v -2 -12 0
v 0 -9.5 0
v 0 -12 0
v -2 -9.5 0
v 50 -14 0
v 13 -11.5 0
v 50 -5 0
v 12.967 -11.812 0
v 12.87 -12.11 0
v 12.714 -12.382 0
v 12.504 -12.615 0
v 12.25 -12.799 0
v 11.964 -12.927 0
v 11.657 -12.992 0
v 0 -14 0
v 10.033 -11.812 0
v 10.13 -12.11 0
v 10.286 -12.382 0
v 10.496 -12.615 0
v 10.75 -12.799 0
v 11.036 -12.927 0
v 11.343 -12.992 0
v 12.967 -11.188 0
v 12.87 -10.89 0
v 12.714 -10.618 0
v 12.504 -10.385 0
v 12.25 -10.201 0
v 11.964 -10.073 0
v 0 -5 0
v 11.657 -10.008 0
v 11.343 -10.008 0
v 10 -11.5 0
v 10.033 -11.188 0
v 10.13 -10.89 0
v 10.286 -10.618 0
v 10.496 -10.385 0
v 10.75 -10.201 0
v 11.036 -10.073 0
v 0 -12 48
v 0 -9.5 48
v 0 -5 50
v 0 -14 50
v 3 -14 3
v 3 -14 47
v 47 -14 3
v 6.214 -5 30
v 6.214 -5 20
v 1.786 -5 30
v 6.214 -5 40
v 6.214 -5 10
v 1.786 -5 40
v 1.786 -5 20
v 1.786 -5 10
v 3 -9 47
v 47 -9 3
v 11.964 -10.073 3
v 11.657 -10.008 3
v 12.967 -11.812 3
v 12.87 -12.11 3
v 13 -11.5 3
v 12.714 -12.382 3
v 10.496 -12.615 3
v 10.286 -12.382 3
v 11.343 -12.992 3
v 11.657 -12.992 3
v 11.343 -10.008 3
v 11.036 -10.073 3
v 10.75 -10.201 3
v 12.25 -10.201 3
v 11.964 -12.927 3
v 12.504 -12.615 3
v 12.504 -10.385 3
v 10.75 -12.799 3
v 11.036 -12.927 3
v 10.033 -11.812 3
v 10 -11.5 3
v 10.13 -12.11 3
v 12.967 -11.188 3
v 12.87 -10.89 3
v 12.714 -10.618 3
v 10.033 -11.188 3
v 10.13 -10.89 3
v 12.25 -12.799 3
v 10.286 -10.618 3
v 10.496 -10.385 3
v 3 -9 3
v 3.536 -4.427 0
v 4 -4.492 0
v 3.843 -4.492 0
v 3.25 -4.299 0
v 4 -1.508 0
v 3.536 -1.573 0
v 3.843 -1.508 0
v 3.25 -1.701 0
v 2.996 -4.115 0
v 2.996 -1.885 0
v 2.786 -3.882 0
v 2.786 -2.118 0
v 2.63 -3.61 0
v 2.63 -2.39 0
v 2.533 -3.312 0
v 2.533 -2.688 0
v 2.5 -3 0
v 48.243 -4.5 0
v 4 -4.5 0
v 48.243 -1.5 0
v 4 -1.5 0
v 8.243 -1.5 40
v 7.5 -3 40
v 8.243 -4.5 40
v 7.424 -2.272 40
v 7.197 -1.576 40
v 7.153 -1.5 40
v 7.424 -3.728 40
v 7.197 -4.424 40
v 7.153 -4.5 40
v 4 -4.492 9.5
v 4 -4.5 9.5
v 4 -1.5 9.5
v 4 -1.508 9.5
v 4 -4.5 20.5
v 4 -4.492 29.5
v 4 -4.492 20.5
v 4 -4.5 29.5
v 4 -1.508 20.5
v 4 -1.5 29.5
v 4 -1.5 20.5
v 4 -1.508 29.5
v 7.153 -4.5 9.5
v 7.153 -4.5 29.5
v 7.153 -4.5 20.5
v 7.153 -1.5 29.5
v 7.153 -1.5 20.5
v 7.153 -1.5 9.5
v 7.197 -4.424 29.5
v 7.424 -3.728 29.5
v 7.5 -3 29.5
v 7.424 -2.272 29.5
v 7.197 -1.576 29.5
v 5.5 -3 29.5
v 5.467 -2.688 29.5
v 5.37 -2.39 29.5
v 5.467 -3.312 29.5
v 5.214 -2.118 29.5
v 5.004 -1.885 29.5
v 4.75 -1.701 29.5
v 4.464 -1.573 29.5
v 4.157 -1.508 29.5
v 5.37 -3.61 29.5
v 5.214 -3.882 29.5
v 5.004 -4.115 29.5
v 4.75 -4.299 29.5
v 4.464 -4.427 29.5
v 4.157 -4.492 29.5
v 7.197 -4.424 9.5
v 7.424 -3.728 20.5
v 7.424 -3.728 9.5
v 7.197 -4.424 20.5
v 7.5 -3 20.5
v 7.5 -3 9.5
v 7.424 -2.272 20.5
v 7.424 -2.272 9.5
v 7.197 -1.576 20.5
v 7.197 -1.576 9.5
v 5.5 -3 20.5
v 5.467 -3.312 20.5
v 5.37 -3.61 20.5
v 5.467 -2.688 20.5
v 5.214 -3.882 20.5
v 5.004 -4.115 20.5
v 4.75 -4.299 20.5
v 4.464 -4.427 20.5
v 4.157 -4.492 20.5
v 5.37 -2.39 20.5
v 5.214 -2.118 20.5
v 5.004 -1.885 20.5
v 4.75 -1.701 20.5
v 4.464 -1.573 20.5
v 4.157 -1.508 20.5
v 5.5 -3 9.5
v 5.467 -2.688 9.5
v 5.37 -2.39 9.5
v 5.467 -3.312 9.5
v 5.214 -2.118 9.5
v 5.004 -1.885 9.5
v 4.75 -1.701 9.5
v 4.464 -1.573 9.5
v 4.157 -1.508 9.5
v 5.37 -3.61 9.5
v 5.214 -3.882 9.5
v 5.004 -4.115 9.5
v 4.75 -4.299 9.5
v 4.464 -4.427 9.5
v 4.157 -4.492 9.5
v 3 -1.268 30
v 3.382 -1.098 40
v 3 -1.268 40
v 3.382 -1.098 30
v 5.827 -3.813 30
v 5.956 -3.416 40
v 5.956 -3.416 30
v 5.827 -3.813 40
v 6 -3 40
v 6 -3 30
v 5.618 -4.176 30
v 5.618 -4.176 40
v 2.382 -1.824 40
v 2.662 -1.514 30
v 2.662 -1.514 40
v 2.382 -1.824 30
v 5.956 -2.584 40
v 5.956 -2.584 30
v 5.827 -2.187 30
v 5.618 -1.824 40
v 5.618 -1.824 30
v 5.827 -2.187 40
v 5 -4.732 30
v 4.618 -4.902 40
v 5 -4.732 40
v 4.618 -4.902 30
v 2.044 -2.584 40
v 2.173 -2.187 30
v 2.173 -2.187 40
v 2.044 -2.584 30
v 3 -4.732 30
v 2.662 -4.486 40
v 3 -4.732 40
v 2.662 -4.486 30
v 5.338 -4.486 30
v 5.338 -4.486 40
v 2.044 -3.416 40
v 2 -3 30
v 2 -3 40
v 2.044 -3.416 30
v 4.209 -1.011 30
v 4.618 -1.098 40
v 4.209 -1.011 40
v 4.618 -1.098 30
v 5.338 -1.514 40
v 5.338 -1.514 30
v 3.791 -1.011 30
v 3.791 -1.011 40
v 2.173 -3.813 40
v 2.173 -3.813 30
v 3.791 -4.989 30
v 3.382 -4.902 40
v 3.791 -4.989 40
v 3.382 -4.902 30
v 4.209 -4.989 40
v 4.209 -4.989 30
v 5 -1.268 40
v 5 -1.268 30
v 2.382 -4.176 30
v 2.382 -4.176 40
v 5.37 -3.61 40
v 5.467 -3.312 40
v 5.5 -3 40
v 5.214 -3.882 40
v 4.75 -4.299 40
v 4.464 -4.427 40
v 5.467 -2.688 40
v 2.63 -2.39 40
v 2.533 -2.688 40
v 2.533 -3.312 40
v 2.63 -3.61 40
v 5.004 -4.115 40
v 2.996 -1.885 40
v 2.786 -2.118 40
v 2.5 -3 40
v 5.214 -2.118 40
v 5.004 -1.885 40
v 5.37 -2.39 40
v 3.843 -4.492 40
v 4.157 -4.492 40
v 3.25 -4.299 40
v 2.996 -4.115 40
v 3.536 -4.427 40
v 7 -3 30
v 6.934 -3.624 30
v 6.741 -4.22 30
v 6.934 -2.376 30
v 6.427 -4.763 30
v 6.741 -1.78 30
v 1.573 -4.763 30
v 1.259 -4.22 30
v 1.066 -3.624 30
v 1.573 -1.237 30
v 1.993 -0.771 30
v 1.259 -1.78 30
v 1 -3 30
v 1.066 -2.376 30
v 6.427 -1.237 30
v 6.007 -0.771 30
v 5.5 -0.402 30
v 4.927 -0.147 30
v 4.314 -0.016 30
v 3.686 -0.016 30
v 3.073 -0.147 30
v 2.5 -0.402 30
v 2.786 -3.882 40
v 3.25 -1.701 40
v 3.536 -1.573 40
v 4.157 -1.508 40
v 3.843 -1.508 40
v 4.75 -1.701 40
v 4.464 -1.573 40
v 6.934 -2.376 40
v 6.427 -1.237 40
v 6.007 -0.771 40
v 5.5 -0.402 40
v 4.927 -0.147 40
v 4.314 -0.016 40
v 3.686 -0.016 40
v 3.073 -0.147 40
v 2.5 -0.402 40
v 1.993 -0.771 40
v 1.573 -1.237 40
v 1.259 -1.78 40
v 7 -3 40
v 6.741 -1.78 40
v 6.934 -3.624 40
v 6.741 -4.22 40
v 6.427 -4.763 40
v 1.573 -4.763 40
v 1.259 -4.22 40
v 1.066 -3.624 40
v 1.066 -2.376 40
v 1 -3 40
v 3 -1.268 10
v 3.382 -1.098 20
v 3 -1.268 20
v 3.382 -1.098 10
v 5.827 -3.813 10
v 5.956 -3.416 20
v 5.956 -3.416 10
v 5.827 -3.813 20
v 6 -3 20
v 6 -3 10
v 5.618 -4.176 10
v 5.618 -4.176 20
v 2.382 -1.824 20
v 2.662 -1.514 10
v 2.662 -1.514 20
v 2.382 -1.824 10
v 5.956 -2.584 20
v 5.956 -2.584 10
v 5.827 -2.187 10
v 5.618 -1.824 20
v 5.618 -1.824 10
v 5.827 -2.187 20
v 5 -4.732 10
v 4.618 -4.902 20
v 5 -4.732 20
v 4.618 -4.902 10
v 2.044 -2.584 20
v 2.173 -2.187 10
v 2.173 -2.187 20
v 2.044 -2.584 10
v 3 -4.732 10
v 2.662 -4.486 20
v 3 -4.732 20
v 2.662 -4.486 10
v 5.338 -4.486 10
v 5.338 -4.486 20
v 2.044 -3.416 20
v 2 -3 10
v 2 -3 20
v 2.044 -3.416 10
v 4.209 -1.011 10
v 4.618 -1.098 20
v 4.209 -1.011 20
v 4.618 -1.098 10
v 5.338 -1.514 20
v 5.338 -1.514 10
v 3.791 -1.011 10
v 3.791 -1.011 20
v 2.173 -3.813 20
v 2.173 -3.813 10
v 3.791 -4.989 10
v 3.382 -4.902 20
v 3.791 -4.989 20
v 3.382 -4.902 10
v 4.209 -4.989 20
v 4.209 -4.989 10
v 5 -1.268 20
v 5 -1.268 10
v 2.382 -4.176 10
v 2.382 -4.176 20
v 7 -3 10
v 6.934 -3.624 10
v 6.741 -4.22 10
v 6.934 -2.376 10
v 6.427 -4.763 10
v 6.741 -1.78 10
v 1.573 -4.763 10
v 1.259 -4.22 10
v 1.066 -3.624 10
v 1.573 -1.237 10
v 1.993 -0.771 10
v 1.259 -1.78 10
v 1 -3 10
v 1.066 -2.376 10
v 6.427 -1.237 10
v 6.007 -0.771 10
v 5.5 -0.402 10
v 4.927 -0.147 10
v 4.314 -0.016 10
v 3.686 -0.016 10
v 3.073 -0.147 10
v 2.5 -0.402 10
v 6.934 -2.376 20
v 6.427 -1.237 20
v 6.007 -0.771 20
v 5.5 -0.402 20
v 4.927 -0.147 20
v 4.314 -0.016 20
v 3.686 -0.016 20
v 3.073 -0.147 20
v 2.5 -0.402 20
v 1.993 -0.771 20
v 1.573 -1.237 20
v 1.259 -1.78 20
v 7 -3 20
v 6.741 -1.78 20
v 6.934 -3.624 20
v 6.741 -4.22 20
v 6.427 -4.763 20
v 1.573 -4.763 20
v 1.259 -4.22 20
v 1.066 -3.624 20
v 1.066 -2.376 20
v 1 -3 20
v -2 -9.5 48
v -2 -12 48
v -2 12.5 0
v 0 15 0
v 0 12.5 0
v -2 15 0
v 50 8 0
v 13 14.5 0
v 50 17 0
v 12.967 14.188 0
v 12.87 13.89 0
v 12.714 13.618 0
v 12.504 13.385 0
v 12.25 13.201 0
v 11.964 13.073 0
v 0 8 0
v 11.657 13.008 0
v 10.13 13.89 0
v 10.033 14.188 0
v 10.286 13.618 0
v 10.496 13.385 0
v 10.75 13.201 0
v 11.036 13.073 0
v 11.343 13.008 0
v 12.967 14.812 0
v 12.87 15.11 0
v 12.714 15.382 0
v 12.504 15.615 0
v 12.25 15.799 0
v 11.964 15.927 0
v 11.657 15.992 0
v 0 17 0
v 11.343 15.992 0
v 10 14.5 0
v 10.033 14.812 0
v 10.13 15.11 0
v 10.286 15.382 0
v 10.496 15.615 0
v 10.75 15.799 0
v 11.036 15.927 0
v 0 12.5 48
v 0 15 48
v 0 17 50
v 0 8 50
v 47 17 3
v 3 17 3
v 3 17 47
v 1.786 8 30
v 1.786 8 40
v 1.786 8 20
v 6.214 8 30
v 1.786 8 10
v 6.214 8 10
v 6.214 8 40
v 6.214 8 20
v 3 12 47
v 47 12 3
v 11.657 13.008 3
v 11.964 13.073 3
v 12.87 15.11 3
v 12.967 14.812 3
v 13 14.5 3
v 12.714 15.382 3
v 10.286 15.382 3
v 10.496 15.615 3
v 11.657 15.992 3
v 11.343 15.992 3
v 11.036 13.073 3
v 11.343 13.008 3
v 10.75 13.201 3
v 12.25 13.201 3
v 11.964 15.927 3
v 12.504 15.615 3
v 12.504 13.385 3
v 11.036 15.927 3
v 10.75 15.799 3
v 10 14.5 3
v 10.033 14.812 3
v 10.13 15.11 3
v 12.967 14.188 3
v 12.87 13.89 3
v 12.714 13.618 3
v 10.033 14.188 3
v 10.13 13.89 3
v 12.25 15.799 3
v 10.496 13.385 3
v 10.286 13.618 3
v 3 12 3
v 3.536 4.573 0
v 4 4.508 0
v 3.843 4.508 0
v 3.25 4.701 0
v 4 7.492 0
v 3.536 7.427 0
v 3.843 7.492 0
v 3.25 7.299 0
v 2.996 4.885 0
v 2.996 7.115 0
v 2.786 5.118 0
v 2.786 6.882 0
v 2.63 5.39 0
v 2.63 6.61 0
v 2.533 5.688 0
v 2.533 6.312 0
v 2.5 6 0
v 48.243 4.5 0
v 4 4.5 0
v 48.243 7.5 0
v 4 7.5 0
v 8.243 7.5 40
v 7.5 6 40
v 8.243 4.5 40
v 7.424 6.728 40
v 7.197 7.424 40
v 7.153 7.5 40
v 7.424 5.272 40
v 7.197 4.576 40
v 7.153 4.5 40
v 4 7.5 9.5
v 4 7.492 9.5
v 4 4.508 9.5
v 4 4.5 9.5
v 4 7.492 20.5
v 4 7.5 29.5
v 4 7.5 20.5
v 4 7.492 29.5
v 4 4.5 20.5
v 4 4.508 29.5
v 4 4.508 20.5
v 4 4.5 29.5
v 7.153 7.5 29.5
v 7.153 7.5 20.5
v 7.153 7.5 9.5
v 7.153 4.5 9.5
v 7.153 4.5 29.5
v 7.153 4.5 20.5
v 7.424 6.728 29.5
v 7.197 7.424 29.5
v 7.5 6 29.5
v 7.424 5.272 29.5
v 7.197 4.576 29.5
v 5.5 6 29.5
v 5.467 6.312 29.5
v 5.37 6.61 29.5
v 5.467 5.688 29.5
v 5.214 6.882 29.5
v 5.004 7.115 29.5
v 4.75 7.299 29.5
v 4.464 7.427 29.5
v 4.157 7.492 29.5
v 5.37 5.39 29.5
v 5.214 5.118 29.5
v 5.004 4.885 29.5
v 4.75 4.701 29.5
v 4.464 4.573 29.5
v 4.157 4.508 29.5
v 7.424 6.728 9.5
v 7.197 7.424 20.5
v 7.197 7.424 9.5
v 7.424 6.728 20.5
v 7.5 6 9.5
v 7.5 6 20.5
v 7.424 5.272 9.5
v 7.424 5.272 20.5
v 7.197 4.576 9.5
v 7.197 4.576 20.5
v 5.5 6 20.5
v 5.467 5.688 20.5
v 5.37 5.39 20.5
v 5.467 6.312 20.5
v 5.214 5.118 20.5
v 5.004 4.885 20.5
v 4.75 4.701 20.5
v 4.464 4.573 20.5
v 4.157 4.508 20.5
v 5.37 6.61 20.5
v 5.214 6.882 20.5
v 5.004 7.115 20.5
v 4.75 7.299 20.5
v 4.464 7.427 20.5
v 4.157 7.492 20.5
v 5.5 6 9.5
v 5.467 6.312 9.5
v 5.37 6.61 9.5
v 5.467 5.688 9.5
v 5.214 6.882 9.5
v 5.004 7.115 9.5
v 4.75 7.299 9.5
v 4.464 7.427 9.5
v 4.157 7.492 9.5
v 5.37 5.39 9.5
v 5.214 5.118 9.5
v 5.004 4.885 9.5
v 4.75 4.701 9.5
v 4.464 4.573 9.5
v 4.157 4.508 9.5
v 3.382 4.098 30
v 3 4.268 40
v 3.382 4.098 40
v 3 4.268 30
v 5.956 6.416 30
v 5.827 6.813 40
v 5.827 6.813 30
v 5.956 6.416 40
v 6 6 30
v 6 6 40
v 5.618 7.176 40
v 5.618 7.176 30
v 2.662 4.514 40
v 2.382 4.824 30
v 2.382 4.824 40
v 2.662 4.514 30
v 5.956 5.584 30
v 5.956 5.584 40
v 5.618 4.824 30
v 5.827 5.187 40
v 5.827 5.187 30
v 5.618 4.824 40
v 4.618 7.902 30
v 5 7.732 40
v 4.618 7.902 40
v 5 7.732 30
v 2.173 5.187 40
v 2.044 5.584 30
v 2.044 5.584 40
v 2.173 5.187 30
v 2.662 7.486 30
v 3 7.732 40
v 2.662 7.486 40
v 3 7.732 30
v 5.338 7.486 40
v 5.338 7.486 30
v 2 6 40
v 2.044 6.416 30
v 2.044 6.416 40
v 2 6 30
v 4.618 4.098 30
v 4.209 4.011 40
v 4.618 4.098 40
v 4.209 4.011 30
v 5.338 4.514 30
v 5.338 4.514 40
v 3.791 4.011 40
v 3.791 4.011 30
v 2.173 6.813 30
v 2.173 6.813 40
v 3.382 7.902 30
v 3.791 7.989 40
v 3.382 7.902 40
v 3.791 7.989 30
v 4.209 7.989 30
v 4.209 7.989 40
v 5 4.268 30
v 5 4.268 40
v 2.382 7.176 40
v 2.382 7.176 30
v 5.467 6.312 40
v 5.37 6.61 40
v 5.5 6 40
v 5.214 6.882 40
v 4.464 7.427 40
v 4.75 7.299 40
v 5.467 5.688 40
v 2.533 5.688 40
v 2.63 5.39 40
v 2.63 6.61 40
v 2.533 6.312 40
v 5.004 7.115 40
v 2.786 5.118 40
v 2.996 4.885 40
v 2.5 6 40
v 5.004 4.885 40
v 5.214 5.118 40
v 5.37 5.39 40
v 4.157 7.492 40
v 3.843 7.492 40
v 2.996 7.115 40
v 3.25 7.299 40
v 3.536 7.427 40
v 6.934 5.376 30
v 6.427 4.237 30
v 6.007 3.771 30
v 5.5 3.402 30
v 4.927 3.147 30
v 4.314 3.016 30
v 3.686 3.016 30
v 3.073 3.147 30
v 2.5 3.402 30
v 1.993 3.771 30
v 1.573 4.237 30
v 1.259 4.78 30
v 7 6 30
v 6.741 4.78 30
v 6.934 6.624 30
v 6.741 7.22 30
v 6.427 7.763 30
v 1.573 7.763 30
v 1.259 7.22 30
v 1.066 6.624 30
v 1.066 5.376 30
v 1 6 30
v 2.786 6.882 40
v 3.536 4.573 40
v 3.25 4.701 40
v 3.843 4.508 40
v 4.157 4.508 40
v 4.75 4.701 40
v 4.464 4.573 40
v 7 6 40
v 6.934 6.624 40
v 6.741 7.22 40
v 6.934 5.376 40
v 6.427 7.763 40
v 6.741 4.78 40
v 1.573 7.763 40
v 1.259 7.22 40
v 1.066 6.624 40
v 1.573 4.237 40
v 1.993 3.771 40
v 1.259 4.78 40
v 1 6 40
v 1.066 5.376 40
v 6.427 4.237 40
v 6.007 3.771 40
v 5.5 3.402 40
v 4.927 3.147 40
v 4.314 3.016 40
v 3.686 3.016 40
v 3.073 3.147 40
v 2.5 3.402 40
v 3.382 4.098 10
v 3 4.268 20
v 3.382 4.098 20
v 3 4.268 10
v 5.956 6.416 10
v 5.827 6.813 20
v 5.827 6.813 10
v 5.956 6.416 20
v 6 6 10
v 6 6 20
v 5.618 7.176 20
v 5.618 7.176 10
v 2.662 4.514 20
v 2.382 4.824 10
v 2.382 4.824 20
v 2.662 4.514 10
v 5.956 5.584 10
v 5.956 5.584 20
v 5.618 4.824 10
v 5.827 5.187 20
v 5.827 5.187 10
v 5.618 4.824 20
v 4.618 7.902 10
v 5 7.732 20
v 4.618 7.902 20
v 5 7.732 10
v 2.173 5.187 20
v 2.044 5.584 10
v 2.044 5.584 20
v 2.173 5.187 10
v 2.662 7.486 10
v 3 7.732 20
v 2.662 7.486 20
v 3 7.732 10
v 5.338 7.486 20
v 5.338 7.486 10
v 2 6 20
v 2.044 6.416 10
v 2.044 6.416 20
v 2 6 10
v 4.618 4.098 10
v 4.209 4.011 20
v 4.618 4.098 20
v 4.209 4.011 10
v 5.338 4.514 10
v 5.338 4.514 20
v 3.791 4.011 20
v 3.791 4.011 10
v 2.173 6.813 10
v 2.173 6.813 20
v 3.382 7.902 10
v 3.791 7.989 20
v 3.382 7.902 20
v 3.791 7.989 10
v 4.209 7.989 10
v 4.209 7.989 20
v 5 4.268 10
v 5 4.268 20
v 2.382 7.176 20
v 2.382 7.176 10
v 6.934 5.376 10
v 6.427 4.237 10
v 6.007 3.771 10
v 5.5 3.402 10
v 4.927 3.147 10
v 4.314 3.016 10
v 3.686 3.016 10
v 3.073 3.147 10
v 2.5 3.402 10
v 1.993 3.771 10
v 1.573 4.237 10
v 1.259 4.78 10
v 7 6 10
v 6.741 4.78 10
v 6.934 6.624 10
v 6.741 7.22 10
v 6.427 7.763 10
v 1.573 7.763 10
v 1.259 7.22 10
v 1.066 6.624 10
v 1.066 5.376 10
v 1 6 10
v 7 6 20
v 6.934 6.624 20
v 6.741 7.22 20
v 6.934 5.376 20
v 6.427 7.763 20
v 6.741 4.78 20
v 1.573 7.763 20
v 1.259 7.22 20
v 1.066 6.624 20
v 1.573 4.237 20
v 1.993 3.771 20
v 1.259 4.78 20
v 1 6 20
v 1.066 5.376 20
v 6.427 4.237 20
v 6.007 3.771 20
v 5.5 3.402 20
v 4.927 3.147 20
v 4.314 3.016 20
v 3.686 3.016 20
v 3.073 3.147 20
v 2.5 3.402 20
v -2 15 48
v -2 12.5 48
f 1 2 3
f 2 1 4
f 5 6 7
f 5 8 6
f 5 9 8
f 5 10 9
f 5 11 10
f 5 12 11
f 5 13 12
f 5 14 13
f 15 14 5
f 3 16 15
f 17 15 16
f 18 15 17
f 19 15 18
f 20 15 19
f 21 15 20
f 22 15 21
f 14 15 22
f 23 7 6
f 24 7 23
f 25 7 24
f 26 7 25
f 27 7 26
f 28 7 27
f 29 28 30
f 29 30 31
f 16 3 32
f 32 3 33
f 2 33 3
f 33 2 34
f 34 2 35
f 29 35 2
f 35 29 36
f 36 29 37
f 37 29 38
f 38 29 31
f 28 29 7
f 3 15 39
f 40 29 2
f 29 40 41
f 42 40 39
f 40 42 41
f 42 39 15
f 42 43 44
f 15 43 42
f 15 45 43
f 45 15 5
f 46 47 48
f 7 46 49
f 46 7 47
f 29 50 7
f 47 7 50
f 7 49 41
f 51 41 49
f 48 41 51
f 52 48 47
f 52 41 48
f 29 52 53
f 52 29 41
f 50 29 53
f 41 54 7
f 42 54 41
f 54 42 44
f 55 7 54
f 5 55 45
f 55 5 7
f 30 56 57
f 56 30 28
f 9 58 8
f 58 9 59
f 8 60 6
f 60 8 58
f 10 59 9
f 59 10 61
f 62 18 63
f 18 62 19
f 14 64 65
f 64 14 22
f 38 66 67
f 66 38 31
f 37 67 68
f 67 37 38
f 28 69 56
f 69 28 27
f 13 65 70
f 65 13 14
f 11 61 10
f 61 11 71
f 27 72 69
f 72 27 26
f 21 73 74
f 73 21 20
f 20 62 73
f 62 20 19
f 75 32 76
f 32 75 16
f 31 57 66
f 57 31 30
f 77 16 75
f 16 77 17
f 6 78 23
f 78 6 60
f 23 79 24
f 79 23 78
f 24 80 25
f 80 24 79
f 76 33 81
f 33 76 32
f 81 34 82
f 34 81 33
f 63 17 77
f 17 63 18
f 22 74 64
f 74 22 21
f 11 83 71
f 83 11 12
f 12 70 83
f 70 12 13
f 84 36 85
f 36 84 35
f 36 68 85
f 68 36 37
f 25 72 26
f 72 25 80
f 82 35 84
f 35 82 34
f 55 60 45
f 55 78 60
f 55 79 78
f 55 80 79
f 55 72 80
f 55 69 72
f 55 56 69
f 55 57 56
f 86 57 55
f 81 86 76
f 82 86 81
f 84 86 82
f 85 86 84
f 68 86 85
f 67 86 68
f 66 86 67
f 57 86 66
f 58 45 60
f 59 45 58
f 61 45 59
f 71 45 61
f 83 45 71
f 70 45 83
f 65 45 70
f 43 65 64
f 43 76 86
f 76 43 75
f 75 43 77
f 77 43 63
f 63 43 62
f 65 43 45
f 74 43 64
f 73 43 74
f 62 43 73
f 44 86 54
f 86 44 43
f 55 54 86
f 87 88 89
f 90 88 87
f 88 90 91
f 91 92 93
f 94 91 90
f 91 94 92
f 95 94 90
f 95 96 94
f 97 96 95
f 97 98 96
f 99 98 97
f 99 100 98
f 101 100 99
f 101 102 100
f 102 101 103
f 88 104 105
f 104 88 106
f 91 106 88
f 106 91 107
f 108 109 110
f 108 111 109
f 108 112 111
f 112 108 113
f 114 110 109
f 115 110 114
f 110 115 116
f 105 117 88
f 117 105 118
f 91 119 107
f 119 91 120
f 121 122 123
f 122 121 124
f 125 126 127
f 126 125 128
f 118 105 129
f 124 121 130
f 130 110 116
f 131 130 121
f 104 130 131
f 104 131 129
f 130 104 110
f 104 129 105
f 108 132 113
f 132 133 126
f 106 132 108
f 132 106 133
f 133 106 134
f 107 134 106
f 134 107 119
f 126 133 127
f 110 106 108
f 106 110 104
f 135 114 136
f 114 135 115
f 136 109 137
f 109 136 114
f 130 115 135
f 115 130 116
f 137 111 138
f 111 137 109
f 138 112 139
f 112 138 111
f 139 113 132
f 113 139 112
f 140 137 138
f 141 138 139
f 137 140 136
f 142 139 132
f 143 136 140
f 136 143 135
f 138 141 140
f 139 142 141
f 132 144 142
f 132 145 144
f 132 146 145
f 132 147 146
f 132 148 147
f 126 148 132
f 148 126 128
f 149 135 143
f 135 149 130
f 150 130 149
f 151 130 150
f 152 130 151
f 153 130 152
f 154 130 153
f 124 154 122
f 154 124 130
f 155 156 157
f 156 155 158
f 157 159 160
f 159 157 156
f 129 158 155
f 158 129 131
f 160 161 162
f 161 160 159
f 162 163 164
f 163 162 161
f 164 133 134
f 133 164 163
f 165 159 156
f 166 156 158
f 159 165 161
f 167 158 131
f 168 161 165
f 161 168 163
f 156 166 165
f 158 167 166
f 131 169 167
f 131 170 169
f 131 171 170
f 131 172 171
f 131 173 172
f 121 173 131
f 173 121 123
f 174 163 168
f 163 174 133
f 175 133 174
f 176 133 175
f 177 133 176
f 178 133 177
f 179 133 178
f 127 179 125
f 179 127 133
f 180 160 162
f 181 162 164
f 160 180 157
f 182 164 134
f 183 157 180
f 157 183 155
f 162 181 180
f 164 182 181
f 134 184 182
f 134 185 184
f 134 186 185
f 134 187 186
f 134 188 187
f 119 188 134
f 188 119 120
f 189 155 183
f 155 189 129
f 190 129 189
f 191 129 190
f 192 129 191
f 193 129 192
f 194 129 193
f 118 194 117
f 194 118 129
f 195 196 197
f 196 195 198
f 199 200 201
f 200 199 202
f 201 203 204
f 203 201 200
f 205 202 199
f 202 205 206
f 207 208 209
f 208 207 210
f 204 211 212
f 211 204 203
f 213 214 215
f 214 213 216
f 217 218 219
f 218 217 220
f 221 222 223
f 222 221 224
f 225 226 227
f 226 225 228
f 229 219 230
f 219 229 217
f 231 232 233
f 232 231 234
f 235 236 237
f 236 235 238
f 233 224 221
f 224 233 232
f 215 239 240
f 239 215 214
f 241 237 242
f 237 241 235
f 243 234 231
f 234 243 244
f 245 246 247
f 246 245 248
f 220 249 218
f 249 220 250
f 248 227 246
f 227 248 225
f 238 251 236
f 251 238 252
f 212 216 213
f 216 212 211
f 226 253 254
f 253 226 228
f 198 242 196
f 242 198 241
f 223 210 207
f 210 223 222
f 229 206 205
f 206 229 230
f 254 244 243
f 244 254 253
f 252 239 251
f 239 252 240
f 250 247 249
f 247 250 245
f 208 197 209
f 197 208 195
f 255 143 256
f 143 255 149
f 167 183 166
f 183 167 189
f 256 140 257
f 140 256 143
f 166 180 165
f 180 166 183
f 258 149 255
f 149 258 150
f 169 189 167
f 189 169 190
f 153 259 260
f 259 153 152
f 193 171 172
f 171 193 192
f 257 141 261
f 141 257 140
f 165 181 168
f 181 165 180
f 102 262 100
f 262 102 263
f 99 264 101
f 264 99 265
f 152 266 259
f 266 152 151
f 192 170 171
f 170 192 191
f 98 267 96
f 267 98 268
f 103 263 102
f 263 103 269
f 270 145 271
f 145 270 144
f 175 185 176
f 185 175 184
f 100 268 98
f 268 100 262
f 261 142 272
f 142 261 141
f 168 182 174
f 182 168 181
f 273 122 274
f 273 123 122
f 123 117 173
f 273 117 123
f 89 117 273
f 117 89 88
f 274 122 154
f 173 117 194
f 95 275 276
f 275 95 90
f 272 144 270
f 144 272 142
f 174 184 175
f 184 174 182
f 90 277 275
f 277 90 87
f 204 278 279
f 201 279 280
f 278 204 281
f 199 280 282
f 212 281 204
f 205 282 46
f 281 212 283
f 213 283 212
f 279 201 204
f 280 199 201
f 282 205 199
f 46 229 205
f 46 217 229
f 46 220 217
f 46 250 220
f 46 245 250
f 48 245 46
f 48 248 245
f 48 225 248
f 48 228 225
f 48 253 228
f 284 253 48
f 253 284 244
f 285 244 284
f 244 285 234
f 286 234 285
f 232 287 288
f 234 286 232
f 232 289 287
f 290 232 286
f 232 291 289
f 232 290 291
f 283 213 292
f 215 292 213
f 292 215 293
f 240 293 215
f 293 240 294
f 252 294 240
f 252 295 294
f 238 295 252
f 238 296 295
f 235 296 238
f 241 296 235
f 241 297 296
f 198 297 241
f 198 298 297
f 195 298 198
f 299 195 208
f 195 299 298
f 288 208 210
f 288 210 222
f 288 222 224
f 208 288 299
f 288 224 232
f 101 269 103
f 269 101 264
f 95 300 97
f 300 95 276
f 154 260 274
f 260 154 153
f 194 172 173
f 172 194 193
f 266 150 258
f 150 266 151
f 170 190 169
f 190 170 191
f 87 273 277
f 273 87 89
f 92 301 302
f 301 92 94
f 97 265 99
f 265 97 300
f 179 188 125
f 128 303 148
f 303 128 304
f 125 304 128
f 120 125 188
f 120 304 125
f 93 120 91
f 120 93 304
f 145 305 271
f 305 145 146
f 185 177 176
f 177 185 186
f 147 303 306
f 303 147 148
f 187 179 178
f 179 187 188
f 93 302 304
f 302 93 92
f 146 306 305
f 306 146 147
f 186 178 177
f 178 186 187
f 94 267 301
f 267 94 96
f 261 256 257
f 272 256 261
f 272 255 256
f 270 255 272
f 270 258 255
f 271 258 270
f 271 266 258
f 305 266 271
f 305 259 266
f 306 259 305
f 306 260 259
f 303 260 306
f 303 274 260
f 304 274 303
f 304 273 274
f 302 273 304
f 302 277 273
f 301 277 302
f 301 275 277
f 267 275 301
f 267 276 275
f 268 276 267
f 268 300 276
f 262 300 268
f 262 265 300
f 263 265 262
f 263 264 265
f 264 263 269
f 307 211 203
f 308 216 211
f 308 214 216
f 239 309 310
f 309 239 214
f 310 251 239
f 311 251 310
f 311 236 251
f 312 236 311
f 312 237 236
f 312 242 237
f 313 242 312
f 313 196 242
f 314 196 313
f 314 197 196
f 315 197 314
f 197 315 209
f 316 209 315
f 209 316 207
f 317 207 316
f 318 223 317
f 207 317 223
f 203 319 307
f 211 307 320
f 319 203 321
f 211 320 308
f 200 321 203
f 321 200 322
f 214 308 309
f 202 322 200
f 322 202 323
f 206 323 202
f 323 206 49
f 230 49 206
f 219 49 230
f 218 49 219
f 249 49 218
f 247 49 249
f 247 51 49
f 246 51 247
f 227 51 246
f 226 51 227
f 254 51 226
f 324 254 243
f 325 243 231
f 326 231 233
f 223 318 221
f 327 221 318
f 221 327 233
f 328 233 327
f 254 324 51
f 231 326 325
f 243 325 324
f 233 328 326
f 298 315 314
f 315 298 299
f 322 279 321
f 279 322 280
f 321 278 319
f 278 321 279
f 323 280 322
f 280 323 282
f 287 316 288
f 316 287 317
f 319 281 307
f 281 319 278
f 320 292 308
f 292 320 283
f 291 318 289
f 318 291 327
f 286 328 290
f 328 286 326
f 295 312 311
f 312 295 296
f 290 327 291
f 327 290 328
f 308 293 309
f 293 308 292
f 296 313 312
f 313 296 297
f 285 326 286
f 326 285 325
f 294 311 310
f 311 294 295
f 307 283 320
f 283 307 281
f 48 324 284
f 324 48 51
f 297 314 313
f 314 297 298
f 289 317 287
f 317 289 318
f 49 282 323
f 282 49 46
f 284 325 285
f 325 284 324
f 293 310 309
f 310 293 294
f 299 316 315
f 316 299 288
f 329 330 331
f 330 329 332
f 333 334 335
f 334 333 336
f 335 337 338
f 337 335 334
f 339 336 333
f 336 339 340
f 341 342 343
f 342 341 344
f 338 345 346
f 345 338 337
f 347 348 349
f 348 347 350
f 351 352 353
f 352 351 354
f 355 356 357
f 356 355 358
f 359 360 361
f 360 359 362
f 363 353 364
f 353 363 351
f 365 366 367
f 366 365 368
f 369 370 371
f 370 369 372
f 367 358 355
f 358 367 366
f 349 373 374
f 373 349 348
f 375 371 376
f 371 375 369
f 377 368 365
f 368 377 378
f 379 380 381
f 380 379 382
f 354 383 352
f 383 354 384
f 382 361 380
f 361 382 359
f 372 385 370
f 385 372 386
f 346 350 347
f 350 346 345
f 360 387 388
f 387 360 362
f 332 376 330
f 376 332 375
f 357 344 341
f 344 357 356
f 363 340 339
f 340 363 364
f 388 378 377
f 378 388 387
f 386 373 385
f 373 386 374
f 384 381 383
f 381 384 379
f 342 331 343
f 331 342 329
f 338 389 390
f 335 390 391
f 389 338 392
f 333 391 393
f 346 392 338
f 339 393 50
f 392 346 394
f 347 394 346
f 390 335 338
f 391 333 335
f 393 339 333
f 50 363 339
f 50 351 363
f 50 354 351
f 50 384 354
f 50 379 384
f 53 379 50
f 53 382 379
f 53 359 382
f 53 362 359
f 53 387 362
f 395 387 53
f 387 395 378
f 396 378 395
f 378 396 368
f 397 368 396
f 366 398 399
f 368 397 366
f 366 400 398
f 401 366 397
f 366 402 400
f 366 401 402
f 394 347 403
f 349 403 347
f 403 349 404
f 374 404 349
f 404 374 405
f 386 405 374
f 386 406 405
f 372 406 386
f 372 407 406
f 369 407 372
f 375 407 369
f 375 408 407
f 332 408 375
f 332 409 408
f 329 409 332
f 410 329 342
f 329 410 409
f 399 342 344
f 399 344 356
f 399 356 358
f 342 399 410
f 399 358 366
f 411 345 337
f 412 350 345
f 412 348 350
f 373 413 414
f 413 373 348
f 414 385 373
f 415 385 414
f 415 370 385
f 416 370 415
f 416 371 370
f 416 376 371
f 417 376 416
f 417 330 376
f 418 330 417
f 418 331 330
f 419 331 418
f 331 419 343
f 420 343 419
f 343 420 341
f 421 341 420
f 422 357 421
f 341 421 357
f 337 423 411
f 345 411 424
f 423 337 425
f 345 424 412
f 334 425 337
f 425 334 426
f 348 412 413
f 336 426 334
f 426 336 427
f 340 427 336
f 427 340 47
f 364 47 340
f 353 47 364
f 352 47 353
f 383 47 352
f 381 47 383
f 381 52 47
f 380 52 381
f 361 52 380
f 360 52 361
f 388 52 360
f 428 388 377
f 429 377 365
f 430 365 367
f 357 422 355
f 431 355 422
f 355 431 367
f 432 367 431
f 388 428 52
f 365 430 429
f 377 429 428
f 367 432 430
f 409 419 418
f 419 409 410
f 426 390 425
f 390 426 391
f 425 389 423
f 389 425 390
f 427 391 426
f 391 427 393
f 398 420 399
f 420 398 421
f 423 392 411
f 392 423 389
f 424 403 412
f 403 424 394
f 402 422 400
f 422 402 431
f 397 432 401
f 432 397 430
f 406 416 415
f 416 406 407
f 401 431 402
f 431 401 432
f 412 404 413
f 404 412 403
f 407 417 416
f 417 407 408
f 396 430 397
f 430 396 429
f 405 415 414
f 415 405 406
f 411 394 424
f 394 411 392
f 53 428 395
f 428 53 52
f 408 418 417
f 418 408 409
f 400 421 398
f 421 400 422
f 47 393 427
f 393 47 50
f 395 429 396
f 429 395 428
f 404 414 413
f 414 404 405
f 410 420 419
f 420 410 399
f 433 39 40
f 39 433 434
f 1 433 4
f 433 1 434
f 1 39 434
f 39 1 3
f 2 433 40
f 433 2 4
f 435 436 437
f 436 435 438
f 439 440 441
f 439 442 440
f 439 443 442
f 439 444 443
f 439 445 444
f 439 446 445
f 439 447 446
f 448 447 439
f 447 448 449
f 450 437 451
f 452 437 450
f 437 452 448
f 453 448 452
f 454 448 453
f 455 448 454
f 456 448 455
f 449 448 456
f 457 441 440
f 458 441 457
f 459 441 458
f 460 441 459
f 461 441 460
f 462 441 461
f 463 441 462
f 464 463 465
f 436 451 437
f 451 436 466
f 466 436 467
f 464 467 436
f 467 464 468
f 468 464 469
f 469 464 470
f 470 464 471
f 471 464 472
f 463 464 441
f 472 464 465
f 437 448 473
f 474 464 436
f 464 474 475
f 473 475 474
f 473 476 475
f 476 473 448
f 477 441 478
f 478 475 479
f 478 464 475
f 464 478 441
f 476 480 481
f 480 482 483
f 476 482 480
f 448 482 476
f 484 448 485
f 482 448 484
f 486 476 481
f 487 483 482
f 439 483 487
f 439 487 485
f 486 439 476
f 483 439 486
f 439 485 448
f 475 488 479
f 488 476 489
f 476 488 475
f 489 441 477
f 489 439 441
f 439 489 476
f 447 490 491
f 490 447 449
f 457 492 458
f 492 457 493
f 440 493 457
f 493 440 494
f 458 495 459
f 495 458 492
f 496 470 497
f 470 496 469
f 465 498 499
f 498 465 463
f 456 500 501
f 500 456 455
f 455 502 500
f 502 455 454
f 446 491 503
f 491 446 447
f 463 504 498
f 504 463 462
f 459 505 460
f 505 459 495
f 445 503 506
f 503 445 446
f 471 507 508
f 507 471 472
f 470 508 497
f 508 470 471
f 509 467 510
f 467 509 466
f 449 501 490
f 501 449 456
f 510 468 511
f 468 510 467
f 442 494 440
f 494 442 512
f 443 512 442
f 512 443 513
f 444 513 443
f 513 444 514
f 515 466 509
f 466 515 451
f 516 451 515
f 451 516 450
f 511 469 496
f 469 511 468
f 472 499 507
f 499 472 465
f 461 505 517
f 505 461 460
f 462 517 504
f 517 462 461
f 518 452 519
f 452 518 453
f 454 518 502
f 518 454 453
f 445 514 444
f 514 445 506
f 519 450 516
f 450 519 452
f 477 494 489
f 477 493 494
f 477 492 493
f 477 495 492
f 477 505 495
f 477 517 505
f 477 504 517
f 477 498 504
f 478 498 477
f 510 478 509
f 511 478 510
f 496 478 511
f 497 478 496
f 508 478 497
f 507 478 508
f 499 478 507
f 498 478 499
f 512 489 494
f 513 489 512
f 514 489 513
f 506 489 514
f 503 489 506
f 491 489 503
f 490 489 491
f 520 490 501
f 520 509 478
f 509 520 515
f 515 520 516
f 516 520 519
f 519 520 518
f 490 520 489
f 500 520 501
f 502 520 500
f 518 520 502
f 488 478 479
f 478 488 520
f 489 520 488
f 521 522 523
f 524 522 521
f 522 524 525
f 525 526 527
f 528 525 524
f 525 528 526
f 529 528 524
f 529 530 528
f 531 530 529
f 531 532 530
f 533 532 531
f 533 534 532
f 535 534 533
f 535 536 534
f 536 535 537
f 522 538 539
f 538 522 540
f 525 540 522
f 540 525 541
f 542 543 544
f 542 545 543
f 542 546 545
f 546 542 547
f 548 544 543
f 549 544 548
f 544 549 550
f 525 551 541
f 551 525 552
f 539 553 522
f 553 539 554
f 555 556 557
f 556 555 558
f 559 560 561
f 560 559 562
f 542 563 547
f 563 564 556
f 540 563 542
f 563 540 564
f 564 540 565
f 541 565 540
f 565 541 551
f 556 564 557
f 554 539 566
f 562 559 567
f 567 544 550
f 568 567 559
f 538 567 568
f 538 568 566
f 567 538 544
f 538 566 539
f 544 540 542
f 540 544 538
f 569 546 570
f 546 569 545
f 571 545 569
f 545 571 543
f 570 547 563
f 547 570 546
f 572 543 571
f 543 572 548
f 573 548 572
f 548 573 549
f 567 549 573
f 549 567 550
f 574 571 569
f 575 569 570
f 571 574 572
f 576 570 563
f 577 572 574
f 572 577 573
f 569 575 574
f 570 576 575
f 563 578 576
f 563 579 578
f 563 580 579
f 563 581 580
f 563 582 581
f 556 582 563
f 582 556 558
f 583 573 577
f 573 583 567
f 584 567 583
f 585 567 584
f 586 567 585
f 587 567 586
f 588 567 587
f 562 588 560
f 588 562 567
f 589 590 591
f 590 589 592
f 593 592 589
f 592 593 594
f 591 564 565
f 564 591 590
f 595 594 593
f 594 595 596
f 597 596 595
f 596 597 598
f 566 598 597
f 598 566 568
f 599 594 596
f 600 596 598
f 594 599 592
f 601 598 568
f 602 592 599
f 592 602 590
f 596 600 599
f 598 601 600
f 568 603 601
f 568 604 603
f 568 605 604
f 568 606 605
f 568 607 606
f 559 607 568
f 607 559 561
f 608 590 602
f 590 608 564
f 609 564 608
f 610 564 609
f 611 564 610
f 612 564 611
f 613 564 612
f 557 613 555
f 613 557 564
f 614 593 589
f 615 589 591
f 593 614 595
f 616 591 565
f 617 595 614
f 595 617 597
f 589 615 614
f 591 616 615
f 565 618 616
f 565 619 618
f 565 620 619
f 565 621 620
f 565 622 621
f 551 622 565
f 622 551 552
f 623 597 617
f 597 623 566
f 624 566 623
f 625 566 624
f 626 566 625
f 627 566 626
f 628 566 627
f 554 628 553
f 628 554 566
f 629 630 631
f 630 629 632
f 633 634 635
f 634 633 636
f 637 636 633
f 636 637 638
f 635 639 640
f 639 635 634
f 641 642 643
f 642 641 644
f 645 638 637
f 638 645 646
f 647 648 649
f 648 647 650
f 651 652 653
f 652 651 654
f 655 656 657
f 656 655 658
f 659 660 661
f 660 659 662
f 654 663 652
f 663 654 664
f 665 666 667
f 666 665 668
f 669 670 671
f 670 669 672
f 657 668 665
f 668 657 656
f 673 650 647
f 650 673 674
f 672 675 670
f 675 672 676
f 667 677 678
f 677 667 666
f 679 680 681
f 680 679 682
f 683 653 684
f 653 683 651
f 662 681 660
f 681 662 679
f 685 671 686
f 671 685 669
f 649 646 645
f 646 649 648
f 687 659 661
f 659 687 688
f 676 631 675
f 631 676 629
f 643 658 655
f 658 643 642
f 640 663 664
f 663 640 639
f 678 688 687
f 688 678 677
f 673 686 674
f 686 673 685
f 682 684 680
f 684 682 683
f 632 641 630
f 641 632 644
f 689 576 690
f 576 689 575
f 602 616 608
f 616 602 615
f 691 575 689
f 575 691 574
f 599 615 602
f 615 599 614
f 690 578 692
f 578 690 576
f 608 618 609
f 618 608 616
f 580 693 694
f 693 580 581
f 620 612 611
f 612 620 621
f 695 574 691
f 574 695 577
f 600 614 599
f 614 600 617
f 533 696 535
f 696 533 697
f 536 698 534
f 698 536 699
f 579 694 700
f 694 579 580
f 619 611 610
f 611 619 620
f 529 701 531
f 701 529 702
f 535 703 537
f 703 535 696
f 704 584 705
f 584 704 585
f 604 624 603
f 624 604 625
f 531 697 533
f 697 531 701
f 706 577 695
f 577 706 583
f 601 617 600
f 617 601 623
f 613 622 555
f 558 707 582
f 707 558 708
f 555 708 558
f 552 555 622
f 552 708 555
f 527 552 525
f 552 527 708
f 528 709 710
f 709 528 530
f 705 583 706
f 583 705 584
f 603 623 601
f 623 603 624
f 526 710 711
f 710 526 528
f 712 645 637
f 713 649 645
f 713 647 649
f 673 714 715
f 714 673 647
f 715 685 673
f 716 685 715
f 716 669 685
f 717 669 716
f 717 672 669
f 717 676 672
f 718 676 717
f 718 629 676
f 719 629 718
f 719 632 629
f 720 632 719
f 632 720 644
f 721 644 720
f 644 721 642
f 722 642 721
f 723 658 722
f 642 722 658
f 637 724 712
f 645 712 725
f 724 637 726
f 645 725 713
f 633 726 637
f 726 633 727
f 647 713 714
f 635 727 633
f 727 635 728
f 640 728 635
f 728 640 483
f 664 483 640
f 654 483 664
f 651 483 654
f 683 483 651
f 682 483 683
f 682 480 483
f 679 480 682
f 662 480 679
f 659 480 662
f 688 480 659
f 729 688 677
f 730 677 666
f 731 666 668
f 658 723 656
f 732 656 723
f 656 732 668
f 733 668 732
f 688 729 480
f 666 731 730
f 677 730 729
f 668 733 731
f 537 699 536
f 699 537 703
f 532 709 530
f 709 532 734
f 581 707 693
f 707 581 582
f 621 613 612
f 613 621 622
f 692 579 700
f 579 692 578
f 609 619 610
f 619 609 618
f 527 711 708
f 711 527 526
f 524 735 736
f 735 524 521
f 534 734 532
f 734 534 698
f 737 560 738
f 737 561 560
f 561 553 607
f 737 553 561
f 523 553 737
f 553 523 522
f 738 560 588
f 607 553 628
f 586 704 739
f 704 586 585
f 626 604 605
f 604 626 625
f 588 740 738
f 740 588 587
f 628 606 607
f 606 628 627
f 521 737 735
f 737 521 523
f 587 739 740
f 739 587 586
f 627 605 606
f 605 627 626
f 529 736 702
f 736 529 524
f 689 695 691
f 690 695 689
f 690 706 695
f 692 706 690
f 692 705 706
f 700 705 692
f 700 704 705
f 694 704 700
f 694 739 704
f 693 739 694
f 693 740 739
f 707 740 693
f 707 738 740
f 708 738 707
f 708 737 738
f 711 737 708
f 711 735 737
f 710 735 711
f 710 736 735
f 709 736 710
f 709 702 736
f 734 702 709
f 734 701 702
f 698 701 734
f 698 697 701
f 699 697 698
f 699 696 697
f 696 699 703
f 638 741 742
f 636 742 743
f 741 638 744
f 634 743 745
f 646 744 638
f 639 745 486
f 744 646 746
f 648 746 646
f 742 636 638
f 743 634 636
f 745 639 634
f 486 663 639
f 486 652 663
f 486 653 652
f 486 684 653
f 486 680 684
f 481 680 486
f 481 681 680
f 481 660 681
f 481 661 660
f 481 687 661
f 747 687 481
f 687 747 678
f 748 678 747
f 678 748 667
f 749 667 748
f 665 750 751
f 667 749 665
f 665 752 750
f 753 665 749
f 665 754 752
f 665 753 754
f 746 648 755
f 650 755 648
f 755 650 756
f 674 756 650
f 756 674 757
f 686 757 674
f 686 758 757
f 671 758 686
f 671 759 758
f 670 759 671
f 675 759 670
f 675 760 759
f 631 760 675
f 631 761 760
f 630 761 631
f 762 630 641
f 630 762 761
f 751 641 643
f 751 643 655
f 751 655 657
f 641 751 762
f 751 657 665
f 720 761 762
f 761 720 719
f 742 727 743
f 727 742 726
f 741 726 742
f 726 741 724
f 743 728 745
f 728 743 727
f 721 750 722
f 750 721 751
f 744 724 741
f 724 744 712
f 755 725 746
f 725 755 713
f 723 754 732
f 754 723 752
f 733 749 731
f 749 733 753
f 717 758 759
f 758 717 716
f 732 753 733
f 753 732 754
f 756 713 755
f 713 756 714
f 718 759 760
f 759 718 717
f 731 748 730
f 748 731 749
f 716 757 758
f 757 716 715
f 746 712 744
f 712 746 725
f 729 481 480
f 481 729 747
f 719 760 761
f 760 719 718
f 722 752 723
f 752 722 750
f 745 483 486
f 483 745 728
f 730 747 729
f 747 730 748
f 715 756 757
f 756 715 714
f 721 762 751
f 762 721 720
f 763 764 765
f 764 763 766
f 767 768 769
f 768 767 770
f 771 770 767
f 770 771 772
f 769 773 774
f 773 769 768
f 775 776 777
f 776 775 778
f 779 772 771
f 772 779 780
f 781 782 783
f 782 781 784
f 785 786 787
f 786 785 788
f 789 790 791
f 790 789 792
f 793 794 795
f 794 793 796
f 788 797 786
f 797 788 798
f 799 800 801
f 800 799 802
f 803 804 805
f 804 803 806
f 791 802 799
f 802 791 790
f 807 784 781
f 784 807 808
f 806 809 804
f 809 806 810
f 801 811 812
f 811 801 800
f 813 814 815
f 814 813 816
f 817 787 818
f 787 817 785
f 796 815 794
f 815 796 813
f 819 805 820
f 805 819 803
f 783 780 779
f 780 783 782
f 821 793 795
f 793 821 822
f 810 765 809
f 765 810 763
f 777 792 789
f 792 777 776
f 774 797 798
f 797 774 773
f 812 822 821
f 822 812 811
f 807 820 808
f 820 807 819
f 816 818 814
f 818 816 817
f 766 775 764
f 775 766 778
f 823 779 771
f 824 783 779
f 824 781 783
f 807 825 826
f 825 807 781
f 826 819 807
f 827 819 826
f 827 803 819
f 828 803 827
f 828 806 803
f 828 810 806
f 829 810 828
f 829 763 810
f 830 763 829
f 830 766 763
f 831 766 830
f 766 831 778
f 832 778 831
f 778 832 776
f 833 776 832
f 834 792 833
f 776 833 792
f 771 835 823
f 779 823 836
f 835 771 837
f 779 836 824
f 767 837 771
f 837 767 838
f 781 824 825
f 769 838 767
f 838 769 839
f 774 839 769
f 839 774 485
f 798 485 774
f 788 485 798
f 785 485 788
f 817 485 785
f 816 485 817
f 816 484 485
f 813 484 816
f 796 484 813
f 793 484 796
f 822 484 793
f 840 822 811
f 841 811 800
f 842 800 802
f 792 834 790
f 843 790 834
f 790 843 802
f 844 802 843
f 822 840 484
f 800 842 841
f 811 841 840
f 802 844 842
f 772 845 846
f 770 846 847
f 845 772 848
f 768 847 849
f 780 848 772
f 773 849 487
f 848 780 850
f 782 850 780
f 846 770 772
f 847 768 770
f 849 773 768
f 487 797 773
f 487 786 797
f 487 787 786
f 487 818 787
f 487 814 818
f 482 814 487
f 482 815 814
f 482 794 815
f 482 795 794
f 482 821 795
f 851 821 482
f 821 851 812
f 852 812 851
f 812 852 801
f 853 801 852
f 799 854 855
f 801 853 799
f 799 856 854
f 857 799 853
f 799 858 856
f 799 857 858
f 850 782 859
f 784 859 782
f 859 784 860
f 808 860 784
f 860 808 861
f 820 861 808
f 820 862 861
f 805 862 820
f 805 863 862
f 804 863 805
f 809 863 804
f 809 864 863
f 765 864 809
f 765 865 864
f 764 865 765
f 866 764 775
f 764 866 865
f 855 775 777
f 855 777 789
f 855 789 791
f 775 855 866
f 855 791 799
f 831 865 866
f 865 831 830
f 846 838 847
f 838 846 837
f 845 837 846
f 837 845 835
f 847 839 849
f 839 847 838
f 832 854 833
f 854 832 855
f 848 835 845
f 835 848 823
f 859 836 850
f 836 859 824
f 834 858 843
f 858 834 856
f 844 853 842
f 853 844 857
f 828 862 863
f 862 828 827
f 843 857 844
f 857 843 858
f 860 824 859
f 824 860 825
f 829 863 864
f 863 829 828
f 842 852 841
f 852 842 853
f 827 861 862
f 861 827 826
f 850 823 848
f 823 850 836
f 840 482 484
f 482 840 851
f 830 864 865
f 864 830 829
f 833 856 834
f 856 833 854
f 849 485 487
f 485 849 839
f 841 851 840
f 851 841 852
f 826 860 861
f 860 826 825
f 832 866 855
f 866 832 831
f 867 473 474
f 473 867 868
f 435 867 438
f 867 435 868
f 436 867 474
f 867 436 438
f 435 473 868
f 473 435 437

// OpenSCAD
//Monoprice Mini Delta Printer corners
//Designed by Nathaniel Stenzel
//August 2019

$fn=30;
pin_thickness=3;
protrusion=0;
face=1;
hinge=1;
piece_1=1;
piece_2=1;
clearance=1;
//there is a screw between 9mm and 14 from the side rail and 4mm to 9mm from the edge of the machine
//top rail is 5.1-5.85 thick
//3.2 wide slot
//2.3 from back of slot to back of rail
module hinge_section(){
    difference(){
    cylinder(d=pin_thickness+3,h=10);
        difference(){
            translate([0,0,-1])cylinder(d=pin_thickness+clearance,h=12);
            cylinder(d=pin_thickness,h=10);
        }
    }
}

//translate([-10,2.7,0])cube([20,3,43]);
/*
difference(){
    translate([-5,5.7,0])cube([10,6.5,45.85]);
    translate([-10,2.7,40])cube([20,5.3,5.85]);
}*/
//translate([-5,0.7,40+5.85])cube([15,11.5,3]);

module door_hinge(){
    difference(){
        intersection(){
            translate([0,-pin_thickness/2,0])cube([45,pin_thickness,40]);
            rotate([0,-45,0])translate([0,-pin_thickness/2,-3])cube([60,pin_thickness,50]);
        }
        cylinder(d=pin_thickness+4,h=10.5);
        translate([0,0,19.5])cylinder(d=pin_thickness+4,h=11);
    }

    cylinder(d=pin_thickness,h=40);
    hinge_section();
    translate([0,0,20])hinge_section();
}

module MMDP_corner_top(hinge=1,protrusion=0,face=1){
    difference(){
        intersection(){
            cube([60,9+protrusion,50]);
            rotate([0,-45,0])cube([90,9+protrusion,50]);
        }
        translate([0,protrusion,0])translate([11.5,6.5,46])cylinder(d=3,h=5);
        if(face) {
            translate([3,4,0])cube([60,9+protrusion,47]);
        } else {
            translate([3,-1,0])cube([60,11+protrusion,47]);
        }            
    }
    if (hinge && face)translate([4,-pin_thickness/2-0.5,10])door_hinge();

    translate([-2,4.5+protrusion,2])cube([3,2.5,48]);

}
if (piece_1){
    translate([0,-5,50])rotate([180,0,0])MMDP_corner_top(hinge=hinge,protrusion=protrusion,face=face);
}
if (piece_2){
    translate([0,8,50])mirror([0,0,1])MMDP_corner_top(hinge=hinge,protrusion=protrusion,face=face);
}
